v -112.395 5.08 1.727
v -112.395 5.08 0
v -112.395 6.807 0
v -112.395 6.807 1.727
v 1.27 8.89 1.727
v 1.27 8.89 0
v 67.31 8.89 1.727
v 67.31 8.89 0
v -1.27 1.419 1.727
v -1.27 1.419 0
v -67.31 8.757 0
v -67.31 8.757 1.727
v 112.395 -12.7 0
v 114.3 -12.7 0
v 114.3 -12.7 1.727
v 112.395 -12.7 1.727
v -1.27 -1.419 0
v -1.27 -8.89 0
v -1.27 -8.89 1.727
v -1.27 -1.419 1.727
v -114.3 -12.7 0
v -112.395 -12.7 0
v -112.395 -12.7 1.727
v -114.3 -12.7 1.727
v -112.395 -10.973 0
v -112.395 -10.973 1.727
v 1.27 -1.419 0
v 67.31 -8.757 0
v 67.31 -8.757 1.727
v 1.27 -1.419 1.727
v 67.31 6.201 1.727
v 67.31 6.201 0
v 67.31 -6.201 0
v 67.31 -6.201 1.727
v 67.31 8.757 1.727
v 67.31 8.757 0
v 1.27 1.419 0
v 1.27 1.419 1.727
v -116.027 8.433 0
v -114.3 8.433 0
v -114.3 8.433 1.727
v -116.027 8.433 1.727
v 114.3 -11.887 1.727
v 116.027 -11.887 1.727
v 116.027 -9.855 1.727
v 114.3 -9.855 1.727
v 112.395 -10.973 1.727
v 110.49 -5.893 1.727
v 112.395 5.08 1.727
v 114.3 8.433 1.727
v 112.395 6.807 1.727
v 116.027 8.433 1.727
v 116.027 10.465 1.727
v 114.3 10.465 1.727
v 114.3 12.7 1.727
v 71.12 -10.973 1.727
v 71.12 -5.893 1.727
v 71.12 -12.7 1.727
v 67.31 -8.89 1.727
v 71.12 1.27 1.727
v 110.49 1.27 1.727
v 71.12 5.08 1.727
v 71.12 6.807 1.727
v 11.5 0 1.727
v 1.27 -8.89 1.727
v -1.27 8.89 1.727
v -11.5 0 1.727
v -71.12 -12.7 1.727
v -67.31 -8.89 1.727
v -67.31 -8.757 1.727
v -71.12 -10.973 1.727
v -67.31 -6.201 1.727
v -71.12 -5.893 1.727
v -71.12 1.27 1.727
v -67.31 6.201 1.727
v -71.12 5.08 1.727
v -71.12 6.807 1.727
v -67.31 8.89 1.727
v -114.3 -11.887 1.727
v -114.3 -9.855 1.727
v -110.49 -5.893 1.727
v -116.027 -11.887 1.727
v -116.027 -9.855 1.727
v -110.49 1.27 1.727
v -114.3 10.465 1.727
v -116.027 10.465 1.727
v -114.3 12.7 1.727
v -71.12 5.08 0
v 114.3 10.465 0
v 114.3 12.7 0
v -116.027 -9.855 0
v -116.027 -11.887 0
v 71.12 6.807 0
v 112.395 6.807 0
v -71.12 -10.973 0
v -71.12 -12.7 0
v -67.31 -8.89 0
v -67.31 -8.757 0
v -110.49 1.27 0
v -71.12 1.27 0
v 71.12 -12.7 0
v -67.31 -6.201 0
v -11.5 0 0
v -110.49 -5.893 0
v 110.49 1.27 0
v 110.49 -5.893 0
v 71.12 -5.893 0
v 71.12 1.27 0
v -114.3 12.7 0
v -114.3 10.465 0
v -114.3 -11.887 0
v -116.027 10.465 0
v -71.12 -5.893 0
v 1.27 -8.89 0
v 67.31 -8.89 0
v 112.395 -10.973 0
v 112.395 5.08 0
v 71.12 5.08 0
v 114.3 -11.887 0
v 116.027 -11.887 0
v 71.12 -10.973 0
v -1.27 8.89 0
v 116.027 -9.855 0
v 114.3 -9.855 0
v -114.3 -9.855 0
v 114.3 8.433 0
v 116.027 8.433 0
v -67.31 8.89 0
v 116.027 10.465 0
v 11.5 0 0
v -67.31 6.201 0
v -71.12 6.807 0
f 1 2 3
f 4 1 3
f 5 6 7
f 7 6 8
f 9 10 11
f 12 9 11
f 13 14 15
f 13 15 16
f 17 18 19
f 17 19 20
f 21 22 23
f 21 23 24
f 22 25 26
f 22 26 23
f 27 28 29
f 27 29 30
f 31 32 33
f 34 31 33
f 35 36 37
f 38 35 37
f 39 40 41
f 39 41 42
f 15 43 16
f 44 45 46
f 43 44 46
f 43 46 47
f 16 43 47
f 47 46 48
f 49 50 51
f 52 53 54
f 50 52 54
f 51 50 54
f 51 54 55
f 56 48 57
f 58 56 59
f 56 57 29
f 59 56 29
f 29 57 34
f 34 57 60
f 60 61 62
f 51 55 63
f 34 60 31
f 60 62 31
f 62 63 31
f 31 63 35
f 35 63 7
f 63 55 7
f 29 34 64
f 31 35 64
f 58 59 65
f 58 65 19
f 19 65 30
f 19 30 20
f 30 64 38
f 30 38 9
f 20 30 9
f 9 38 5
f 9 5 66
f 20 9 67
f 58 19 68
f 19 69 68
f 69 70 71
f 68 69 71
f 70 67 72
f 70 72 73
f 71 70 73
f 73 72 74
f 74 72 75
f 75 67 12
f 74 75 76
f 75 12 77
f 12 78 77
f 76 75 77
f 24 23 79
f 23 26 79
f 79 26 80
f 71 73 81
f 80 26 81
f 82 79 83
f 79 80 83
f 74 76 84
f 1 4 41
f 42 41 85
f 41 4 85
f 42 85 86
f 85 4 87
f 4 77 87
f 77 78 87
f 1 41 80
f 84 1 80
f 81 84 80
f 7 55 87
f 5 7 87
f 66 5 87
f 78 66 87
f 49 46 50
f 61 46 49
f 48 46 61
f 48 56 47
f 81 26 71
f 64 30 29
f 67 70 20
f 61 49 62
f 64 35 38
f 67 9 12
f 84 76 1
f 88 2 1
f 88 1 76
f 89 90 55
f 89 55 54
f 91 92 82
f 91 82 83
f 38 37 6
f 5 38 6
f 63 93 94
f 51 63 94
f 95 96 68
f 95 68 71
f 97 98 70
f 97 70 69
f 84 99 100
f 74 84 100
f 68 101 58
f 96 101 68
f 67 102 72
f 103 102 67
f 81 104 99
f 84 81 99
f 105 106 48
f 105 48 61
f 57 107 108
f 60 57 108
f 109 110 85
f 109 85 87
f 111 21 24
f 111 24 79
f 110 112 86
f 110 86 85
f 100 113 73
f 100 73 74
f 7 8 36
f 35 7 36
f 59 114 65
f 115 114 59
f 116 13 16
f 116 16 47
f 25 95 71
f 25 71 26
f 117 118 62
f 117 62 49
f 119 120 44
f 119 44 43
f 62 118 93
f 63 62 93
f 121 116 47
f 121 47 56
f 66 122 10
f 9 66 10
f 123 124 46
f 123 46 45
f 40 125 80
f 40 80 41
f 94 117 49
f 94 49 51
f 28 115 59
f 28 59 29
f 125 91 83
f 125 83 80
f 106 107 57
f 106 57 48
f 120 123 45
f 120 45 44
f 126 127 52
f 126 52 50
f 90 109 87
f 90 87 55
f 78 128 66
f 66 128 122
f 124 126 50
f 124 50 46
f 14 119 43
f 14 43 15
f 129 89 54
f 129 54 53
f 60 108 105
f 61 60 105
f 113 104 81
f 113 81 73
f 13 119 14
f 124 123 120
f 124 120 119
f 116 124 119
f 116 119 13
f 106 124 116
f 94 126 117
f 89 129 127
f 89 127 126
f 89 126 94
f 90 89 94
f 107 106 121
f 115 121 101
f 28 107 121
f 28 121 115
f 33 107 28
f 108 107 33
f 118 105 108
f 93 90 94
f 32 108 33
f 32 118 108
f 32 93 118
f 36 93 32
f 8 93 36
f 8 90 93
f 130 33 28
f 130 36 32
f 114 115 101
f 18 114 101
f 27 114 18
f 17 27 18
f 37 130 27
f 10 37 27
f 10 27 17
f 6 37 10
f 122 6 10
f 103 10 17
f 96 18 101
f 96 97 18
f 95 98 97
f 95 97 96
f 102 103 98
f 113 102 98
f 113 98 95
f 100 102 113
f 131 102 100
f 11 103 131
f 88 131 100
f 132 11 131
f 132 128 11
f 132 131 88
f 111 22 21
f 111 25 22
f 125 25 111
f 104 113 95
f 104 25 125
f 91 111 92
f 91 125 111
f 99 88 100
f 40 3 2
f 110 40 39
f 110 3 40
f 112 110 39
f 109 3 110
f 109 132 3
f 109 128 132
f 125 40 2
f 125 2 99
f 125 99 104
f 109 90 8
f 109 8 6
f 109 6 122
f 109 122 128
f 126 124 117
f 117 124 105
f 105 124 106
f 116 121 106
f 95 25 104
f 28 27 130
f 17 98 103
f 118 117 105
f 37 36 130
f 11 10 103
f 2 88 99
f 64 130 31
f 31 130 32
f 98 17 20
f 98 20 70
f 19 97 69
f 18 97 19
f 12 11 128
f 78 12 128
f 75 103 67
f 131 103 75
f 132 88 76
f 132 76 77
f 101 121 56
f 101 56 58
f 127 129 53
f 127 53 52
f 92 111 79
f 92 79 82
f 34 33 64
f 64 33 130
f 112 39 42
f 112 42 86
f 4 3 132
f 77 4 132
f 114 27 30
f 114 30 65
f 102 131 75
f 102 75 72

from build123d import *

# Parameters (mm, degrees)
SKETCH1_W           = 41.275
SKETCH1_H           = 1.7272
SKETCH1_W_2         = 39.37
SKETCH1_H_2         = 7.1628
BOSS_EXTRUDE1_DEPTH = 1.7272


with BuildPart() as part:
    # Sketch1 → Boss-Extrude1 (new body)
    with BuildSketch(Plane.XY):
        Polygon((-112.395, -12.7), (-114.3, -12.7), (-114.3, -11.8872), (-116.0272, -11.8872), (-116.0272, -9.8552), (-114.3, -9.8552), (-114.3, 8.4328), (-116.0272, 8.4328), (-116.0272, 10.4648), (-114.3, 10.4648), (-114.3, 12.7), (114.3, 12.7), (114.3, 10.4648), (116.0272, 10.4648), (116.0272, 8.4328), (114.3, 8.4328), (114.3, -9.8552), (116.0272, -9.8552), (116.0272, -11.8872), (114.3, -11.8872), (114.3, -12.7), (112.395, -12.7), (112.395, -10.9728), (71.12, -10.9728), (71.12, -12.7), (-71.12, -12.7), (-71.12, -10.9728), (-112.395, -10.9728), align=None)
        Polygon((67.31, -6.201073431), (11.500339125, 0), (67.31, 6.201073431), align=None, mode=Mode.SUBTRACT)
        Polygon((-67.31, 8.89), (-1.27, 8.89), (-1.27, 1.418926569), (-67.31, 8.756704347), align=None, mode=Mode.SUBTRACT)
        Polygon((-67.31, -8.89), (-1.27, -8.89), (-1.27, -1.418926569), (-67.31, -8.756704347), align=None, mode=Mode.SUBTRACT)
        Polygon((67.31, 8.89), (67.31, 8.756704347), (1.27, 1.418926569), (1.27, 8.89), align=None, mode=Mode.SUBTRACT)
        Polygon((67.31, -8.756704347), (1.27, -1.418926569), (1.27, -8.89), (67.31, -8.89), align=None, mode=Mode.SUBTRACT)
        Polygon((-67.31, 6.201073431), (-67.31, -6.201073431), (-11.500339125, 0), align=None, mode=Mode.SUBTRACT)
        with Locations((-91.7575, 5.9436)):
            Rectangle(SKETCH1_W, SKETCH1_H, mode=Mode.SUBTRACT)
        with Locations((91.7575, 5.9436)):
            Rectangle(SKETCH1_W, SKETCH1_H, mode=Mode.SUBTRACT)
        with Locations((90.805, -2.3114)):
            Rectangle(SKETCH1_W_2, SKETCH1_H_2, mode=Mode.SUBTRACT)
        with Locations((-90.805, -2.3114)):
            Rectangle(SKETCH1_W_2, SKETCH1_H_2, mode=Mode.SUBTRACT)
    extrude(amount=BOSS_EXTRUDE1_DEPTH)


solid = part.part
